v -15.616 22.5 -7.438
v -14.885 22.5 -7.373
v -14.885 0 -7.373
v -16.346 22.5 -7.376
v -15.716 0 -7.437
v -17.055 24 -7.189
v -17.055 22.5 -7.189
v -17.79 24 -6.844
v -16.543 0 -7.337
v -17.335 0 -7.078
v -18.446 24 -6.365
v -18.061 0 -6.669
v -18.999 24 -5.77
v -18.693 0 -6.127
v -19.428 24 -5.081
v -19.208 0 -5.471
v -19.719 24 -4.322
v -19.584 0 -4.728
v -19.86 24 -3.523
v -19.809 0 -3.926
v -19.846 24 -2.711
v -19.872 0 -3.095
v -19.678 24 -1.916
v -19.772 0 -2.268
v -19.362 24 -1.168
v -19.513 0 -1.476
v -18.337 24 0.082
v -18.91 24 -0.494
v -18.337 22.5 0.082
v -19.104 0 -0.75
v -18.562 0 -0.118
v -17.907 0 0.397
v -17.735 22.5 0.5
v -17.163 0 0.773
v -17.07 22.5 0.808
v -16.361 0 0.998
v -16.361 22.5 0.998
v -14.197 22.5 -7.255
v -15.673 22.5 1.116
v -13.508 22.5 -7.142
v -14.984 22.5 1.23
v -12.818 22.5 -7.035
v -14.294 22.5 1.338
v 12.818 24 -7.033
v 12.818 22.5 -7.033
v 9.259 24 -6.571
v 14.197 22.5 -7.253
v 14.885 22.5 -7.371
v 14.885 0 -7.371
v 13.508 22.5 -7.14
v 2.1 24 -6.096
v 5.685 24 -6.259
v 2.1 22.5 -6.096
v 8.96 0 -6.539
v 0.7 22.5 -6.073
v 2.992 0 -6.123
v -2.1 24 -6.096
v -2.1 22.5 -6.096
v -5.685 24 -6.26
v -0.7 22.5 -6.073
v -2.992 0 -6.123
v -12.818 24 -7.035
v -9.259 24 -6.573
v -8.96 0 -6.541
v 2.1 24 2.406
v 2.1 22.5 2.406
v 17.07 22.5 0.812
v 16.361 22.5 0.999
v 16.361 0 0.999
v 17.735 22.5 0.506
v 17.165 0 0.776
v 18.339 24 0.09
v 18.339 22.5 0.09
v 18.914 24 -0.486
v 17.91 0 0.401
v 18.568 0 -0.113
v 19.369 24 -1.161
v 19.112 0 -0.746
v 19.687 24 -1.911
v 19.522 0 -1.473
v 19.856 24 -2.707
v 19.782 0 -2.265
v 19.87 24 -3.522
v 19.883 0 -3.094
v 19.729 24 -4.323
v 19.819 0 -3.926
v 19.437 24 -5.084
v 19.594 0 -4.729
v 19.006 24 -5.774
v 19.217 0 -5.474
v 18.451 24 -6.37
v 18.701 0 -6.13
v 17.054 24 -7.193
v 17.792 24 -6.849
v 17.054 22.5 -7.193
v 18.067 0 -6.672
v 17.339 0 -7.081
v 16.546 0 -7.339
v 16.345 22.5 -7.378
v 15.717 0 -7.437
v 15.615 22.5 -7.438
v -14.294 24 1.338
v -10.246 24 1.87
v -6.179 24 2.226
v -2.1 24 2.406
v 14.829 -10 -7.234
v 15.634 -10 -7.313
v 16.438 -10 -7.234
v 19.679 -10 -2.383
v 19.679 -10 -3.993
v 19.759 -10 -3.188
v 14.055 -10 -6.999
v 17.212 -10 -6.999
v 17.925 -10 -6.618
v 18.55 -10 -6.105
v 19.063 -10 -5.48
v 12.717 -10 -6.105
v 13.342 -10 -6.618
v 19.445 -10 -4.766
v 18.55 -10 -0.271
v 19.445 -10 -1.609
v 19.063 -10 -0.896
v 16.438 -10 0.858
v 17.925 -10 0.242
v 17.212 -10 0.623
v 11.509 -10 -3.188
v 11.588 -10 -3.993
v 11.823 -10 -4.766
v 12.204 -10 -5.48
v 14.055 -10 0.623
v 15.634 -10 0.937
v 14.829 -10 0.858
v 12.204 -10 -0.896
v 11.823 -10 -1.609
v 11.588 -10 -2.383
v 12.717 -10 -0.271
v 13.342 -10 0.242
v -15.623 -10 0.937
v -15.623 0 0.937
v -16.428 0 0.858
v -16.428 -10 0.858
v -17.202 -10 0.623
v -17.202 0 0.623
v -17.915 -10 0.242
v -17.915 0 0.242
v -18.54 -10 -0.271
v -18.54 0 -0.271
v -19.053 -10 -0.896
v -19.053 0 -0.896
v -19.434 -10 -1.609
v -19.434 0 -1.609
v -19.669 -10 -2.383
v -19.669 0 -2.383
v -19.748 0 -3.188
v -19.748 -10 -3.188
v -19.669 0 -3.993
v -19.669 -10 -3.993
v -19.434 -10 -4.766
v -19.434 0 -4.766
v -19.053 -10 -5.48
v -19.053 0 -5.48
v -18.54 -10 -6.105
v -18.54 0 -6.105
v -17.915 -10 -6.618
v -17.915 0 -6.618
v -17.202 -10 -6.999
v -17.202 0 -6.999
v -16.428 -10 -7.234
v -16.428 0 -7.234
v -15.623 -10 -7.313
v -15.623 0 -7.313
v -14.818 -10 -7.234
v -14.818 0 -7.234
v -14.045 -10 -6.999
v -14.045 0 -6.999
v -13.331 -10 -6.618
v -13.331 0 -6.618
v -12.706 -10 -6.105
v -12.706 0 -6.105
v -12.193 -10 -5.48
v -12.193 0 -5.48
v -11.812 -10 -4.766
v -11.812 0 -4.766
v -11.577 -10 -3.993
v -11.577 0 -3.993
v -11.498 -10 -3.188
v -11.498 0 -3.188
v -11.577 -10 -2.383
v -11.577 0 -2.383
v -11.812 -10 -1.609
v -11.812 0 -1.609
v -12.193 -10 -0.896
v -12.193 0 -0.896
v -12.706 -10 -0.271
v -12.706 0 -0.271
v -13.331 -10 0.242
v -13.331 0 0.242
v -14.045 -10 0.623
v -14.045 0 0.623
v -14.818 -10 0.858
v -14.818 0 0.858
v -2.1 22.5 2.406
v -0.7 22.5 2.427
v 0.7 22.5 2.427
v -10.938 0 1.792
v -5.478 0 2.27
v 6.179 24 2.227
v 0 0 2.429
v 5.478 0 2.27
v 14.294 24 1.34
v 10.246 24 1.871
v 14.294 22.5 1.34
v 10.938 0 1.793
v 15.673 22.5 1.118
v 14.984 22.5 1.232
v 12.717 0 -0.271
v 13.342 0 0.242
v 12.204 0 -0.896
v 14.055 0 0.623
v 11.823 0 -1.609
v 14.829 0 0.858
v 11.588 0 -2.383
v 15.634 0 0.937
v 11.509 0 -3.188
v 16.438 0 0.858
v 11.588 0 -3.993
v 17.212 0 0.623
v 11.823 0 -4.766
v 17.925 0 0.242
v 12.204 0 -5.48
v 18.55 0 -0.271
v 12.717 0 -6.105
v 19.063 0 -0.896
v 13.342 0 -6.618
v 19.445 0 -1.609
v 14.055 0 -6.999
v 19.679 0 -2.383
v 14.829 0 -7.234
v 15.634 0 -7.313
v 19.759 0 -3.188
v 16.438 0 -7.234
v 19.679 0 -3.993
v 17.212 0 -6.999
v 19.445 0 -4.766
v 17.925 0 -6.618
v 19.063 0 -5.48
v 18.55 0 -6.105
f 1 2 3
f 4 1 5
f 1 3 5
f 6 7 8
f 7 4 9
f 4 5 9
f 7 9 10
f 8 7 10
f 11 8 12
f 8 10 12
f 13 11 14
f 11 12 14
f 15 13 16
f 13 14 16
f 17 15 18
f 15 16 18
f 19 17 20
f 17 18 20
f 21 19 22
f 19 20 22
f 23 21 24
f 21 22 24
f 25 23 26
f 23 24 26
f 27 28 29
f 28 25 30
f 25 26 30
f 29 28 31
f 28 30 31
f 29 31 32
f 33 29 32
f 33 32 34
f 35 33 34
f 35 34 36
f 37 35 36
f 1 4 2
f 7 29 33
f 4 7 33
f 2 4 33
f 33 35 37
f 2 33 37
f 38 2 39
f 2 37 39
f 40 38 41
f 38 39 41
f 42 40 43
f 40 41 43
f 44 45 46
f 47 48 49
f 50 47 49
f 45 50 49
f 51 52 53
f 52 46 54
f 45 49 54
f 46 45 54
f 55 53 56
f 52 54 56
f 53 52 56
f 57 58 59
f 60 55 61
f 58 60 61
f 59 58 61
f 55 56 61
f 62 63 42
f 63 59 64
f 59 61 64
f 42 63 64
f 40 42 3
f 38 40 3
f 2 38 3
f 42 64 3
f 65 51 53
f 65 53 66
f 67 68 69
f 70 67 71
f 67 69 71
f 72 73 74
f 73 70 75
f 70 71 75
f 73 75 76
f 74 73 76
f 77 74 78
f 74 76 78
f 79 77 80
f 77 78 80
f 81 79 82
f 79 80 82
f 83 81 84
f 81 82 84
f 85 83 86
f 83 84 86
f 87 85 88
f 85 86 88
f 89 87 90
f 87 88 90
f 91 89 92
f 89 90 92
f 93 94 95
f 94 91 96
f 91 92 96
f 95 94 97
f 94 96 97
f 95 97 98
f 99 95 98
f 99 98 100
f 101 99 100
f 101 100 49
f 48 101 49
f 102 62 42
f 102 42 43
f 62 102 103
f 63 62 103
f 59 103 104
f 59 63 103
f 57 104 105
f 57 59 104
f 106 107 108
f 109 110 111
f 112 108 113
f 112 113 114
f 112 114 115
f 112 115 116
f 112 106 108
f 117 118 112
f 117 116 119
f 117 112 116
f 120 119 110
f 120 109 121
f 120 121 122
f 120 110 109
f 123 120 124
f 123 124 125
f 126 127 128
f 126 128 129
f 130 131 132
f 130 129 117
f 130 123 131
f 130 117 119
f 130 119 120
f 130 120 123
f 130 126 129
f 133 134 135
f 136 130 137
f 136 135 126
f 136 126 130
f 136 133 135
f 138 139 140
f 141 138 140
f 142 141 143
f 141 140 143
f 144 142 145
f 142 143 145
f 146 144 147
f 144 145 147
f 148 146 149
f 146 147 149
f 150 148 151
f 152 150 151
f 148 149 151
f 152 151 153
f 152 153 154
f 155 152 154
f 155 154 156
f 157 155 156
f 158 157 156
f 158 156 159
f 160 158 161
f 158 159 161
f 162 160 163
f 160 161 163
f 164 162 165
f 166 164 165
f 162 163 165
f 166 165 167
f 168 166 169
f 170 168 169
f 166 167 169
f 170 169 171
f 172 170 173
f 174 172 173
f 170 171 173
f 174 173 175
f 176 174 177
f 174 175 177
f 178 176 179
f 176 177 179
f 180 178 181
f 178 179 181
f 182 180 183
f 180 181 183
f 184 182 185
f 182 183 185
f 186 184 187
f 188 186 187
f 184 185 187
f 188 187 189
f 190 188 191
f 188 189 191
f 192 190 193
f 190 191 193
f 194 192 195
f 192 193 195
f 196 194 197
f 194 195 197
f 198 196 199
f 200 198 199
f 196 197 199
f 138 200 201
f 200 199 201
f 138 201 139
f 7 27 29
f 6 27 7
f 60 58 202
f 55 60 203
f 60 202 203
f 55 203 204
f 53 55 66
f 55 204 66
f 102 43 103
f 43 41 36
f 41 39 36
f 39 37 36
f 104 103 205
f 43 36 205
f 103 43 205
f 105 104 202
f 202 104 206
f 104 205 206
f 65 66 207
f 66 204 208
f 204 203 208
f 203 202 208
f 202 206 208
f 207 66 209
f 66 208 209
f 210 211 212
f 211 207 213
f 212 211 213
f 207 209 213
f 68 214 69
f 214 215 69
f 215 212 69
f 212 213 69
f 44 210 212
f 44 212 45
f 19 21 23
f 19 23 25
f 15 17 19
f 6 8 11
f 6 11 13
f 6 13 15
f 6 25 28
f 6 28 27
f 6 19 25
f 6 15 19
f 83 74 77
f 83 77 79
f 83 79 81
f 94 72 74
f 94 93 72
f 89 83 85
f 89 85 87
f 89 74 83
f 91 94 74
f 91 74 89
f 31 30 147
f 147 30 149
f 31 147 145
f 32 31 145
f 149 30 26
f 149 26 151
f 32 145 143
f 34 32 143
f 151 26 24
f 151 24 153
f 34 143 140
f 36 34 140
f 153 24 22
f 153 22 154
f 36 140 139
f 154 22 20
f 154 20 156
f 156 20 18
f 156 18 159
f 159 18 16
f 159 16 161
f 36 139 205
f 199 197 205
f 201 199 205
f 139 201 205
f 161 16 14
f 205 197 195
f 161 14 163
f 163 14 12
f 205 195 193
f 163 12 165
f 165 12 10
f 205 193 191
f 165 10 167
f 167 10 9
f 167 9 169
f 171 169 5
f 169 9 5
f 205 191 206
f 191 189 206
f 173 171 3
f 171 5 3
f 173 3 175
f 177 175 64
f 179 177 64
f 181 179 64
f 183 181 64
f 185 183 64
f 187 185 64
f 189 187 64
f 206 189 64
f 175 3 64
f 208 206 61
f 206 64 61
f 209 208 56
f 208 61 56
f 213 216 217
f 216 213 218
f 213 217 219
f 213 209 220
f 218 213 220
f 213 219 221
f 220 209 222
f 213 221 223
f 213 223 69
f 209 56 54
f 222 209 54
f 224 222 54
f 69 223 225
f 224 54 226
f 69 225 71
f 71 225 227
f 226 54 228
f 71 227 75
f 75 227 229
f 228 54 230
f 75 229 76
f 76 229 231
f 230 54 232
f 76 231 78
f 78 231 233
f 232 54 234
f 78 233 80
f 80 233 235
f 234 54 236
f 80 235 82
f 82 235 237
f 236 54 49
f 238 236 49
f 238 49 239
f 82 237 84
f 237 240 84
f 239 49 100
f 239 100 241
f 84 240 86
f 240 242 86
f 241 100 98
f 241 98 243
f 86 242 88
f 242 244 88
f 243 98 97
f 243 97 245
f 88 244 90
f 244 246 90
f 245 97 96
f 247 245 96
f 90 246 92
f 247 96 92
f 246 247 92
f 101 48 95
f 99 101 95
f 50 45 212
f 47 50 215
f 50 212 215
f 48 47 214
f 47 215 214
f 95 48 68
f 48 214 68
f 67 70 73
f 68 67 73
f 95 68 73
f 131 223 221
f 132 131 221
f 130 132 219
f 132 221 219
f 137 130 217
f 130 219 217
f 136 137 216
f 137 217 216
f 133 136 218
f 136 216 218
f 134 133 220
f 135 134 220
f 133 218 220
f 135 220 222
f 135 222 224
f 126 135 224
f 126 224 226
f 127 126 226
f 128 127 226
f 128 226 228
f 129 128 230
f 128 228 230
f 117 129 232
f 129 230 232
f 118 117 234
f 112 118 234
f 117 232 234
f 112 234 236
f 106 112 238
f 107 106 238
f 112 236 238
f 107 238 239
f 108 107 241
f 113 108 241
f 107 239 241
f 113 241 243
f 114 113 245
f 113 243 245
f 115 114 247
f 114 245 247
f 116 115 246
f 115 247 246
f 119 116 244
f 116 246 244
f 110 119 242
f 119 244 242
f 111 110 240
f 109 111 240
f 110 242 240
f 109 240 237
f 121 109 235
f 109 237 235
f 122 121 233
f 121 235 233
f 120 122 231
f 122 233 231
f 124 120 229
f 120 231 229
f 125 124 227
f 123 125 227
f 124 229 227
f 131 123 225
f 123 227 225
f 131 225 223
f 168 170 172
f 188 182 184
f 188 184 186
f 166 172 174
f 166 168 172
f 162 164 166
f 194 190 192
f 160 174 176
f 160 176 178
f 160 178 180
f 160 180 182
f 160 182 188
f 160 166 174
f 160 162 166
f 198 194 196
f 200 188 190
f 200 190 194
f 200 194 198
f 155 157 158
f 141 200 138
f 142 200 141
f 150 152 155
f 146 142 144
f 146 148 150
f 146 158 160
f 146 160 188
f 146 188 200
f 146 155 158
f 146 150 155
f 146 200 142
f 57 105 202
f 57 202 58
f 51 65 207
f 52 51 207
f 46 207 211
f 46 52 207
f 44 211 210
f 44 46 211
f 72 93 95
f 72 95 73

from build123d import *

# Parameters (mm, degrees)
BOSS_EXTRUDE1_DEPTH             = 24
SKETCH2_R                       = 4.125
BOSS_EXTRUDE2_DEPTH             = 10
CUT_EXTRUDE1_START              = -24
CUT_EXTRUDE1_DEPTH              = 1.5
CIRPATTERN1_COUNT               = 2
CIRPATTERN1_ANGLE               = 10
CIRPATTERN1_THE_OTHER_WAY_COUNT = 2
CIRPATTERN1_THE_OTHER_WAY_ANGLE = 10


with BuildPart() as part:
    # Sketch1 → Boss-Extrude1 (new body)
    with BuildSketch(Plane(origin=(0, 0, 0), x_dir=(1, 0, 0), z_dir=(0, 1, 0))):
        with BuildLine():
            ThreePointArc((-16.361099339, -0.997559555), (0, -2.429428688), (16.361258496, -0.999379302))
            ThreePointArc((16.361258496, -0.999379302), (19.819023, 3.925881002), (14.885248975, 7.371486655))
            ThreePointArc((14.885248975, 7.371486655), (0, 6.070571326), (-14.885089829, 7.373306345))
            ThreePointArc((-14.885089829, 7.373306345), (-19.808527535, 3.92587815), (-16.361099339, -0.997559555))
        make_face()
    extrude(amount=BOSS_EXTRUDE1_DEPTH)

    # Sketch2 → Boss-Extrude2 (add)
    with BuildSketch(Plane.XZ):
        with Locations(Location((-15.623094584, -3.187873395, 0), (0, 0, 90))):
            Circle(SKETCH2_R)
        with Locations(Location((15.633577289, -3.187873997, 0), (0, 0, 90))):
            Circle(SKETCH2_R)
    extrude(amount=BOSS_EXTRUDE2_DEPTH)

    # Sketch4 → Cut-Extrude1 (cut)
    with BuildSketch(Plane.XZ.offset(CUT_EXTRUDE1_START)):
        with BuildLine():
            Line((-2.1, 2.405913745), (-2.1, -6.140590357))
            ThreePointArc((-2.1, -6.140590357), (-0.000388897, -6.081612393), (2.1, -6.096161069))
            Line((2.1, -6.096161069), (2.1, 2.406147372))
            ThreePointArc((2.1, 2.406147372), (-3.4179e-05, 3.020482466), (-2.1, 2.405913745))
        make_face()
    cut_extrude1 = extrude(amount=CUT_EXTRUDE1_DEPTH, mode=Mode.SUBTRACT)

    # CirPattern1: Cut-Extrude1 ×2 about axis
    cirpattern1_axis = Axis((0.005241406, 24, -91.820571166), (0, 1, 0))
    for i in range(1, CIRPATTERN1_COUNT):
        add(cut_extrude1.rotate(cirpattern1_axis, i * CIRPATTERN1_ANGLE / (CIRPATTERN1_COUNT - 1)), mode=Mode.SUBTRACT)

    # CirPattern1 the other way: Cut-Extrude1 ×2 about axis
    cirpattern1_the_other_way_axis = Axis((0.005241406, 24, -91.820571166), (0, -1, 0))
    for i in range(1, CIRPATTERN1_THE_OTHER_WAY_COUNT):
        add(cut_extrude1.rotate(cirpattern1_the_other_way_axis, i * CIRPATTERN1_THE_OTHER_WAY_ANGLE / (CIRPATTERN1_THE_OTHER_WAY_COUNT - 1)), mode=Mode.SUBTRACT)


solid = part.part
